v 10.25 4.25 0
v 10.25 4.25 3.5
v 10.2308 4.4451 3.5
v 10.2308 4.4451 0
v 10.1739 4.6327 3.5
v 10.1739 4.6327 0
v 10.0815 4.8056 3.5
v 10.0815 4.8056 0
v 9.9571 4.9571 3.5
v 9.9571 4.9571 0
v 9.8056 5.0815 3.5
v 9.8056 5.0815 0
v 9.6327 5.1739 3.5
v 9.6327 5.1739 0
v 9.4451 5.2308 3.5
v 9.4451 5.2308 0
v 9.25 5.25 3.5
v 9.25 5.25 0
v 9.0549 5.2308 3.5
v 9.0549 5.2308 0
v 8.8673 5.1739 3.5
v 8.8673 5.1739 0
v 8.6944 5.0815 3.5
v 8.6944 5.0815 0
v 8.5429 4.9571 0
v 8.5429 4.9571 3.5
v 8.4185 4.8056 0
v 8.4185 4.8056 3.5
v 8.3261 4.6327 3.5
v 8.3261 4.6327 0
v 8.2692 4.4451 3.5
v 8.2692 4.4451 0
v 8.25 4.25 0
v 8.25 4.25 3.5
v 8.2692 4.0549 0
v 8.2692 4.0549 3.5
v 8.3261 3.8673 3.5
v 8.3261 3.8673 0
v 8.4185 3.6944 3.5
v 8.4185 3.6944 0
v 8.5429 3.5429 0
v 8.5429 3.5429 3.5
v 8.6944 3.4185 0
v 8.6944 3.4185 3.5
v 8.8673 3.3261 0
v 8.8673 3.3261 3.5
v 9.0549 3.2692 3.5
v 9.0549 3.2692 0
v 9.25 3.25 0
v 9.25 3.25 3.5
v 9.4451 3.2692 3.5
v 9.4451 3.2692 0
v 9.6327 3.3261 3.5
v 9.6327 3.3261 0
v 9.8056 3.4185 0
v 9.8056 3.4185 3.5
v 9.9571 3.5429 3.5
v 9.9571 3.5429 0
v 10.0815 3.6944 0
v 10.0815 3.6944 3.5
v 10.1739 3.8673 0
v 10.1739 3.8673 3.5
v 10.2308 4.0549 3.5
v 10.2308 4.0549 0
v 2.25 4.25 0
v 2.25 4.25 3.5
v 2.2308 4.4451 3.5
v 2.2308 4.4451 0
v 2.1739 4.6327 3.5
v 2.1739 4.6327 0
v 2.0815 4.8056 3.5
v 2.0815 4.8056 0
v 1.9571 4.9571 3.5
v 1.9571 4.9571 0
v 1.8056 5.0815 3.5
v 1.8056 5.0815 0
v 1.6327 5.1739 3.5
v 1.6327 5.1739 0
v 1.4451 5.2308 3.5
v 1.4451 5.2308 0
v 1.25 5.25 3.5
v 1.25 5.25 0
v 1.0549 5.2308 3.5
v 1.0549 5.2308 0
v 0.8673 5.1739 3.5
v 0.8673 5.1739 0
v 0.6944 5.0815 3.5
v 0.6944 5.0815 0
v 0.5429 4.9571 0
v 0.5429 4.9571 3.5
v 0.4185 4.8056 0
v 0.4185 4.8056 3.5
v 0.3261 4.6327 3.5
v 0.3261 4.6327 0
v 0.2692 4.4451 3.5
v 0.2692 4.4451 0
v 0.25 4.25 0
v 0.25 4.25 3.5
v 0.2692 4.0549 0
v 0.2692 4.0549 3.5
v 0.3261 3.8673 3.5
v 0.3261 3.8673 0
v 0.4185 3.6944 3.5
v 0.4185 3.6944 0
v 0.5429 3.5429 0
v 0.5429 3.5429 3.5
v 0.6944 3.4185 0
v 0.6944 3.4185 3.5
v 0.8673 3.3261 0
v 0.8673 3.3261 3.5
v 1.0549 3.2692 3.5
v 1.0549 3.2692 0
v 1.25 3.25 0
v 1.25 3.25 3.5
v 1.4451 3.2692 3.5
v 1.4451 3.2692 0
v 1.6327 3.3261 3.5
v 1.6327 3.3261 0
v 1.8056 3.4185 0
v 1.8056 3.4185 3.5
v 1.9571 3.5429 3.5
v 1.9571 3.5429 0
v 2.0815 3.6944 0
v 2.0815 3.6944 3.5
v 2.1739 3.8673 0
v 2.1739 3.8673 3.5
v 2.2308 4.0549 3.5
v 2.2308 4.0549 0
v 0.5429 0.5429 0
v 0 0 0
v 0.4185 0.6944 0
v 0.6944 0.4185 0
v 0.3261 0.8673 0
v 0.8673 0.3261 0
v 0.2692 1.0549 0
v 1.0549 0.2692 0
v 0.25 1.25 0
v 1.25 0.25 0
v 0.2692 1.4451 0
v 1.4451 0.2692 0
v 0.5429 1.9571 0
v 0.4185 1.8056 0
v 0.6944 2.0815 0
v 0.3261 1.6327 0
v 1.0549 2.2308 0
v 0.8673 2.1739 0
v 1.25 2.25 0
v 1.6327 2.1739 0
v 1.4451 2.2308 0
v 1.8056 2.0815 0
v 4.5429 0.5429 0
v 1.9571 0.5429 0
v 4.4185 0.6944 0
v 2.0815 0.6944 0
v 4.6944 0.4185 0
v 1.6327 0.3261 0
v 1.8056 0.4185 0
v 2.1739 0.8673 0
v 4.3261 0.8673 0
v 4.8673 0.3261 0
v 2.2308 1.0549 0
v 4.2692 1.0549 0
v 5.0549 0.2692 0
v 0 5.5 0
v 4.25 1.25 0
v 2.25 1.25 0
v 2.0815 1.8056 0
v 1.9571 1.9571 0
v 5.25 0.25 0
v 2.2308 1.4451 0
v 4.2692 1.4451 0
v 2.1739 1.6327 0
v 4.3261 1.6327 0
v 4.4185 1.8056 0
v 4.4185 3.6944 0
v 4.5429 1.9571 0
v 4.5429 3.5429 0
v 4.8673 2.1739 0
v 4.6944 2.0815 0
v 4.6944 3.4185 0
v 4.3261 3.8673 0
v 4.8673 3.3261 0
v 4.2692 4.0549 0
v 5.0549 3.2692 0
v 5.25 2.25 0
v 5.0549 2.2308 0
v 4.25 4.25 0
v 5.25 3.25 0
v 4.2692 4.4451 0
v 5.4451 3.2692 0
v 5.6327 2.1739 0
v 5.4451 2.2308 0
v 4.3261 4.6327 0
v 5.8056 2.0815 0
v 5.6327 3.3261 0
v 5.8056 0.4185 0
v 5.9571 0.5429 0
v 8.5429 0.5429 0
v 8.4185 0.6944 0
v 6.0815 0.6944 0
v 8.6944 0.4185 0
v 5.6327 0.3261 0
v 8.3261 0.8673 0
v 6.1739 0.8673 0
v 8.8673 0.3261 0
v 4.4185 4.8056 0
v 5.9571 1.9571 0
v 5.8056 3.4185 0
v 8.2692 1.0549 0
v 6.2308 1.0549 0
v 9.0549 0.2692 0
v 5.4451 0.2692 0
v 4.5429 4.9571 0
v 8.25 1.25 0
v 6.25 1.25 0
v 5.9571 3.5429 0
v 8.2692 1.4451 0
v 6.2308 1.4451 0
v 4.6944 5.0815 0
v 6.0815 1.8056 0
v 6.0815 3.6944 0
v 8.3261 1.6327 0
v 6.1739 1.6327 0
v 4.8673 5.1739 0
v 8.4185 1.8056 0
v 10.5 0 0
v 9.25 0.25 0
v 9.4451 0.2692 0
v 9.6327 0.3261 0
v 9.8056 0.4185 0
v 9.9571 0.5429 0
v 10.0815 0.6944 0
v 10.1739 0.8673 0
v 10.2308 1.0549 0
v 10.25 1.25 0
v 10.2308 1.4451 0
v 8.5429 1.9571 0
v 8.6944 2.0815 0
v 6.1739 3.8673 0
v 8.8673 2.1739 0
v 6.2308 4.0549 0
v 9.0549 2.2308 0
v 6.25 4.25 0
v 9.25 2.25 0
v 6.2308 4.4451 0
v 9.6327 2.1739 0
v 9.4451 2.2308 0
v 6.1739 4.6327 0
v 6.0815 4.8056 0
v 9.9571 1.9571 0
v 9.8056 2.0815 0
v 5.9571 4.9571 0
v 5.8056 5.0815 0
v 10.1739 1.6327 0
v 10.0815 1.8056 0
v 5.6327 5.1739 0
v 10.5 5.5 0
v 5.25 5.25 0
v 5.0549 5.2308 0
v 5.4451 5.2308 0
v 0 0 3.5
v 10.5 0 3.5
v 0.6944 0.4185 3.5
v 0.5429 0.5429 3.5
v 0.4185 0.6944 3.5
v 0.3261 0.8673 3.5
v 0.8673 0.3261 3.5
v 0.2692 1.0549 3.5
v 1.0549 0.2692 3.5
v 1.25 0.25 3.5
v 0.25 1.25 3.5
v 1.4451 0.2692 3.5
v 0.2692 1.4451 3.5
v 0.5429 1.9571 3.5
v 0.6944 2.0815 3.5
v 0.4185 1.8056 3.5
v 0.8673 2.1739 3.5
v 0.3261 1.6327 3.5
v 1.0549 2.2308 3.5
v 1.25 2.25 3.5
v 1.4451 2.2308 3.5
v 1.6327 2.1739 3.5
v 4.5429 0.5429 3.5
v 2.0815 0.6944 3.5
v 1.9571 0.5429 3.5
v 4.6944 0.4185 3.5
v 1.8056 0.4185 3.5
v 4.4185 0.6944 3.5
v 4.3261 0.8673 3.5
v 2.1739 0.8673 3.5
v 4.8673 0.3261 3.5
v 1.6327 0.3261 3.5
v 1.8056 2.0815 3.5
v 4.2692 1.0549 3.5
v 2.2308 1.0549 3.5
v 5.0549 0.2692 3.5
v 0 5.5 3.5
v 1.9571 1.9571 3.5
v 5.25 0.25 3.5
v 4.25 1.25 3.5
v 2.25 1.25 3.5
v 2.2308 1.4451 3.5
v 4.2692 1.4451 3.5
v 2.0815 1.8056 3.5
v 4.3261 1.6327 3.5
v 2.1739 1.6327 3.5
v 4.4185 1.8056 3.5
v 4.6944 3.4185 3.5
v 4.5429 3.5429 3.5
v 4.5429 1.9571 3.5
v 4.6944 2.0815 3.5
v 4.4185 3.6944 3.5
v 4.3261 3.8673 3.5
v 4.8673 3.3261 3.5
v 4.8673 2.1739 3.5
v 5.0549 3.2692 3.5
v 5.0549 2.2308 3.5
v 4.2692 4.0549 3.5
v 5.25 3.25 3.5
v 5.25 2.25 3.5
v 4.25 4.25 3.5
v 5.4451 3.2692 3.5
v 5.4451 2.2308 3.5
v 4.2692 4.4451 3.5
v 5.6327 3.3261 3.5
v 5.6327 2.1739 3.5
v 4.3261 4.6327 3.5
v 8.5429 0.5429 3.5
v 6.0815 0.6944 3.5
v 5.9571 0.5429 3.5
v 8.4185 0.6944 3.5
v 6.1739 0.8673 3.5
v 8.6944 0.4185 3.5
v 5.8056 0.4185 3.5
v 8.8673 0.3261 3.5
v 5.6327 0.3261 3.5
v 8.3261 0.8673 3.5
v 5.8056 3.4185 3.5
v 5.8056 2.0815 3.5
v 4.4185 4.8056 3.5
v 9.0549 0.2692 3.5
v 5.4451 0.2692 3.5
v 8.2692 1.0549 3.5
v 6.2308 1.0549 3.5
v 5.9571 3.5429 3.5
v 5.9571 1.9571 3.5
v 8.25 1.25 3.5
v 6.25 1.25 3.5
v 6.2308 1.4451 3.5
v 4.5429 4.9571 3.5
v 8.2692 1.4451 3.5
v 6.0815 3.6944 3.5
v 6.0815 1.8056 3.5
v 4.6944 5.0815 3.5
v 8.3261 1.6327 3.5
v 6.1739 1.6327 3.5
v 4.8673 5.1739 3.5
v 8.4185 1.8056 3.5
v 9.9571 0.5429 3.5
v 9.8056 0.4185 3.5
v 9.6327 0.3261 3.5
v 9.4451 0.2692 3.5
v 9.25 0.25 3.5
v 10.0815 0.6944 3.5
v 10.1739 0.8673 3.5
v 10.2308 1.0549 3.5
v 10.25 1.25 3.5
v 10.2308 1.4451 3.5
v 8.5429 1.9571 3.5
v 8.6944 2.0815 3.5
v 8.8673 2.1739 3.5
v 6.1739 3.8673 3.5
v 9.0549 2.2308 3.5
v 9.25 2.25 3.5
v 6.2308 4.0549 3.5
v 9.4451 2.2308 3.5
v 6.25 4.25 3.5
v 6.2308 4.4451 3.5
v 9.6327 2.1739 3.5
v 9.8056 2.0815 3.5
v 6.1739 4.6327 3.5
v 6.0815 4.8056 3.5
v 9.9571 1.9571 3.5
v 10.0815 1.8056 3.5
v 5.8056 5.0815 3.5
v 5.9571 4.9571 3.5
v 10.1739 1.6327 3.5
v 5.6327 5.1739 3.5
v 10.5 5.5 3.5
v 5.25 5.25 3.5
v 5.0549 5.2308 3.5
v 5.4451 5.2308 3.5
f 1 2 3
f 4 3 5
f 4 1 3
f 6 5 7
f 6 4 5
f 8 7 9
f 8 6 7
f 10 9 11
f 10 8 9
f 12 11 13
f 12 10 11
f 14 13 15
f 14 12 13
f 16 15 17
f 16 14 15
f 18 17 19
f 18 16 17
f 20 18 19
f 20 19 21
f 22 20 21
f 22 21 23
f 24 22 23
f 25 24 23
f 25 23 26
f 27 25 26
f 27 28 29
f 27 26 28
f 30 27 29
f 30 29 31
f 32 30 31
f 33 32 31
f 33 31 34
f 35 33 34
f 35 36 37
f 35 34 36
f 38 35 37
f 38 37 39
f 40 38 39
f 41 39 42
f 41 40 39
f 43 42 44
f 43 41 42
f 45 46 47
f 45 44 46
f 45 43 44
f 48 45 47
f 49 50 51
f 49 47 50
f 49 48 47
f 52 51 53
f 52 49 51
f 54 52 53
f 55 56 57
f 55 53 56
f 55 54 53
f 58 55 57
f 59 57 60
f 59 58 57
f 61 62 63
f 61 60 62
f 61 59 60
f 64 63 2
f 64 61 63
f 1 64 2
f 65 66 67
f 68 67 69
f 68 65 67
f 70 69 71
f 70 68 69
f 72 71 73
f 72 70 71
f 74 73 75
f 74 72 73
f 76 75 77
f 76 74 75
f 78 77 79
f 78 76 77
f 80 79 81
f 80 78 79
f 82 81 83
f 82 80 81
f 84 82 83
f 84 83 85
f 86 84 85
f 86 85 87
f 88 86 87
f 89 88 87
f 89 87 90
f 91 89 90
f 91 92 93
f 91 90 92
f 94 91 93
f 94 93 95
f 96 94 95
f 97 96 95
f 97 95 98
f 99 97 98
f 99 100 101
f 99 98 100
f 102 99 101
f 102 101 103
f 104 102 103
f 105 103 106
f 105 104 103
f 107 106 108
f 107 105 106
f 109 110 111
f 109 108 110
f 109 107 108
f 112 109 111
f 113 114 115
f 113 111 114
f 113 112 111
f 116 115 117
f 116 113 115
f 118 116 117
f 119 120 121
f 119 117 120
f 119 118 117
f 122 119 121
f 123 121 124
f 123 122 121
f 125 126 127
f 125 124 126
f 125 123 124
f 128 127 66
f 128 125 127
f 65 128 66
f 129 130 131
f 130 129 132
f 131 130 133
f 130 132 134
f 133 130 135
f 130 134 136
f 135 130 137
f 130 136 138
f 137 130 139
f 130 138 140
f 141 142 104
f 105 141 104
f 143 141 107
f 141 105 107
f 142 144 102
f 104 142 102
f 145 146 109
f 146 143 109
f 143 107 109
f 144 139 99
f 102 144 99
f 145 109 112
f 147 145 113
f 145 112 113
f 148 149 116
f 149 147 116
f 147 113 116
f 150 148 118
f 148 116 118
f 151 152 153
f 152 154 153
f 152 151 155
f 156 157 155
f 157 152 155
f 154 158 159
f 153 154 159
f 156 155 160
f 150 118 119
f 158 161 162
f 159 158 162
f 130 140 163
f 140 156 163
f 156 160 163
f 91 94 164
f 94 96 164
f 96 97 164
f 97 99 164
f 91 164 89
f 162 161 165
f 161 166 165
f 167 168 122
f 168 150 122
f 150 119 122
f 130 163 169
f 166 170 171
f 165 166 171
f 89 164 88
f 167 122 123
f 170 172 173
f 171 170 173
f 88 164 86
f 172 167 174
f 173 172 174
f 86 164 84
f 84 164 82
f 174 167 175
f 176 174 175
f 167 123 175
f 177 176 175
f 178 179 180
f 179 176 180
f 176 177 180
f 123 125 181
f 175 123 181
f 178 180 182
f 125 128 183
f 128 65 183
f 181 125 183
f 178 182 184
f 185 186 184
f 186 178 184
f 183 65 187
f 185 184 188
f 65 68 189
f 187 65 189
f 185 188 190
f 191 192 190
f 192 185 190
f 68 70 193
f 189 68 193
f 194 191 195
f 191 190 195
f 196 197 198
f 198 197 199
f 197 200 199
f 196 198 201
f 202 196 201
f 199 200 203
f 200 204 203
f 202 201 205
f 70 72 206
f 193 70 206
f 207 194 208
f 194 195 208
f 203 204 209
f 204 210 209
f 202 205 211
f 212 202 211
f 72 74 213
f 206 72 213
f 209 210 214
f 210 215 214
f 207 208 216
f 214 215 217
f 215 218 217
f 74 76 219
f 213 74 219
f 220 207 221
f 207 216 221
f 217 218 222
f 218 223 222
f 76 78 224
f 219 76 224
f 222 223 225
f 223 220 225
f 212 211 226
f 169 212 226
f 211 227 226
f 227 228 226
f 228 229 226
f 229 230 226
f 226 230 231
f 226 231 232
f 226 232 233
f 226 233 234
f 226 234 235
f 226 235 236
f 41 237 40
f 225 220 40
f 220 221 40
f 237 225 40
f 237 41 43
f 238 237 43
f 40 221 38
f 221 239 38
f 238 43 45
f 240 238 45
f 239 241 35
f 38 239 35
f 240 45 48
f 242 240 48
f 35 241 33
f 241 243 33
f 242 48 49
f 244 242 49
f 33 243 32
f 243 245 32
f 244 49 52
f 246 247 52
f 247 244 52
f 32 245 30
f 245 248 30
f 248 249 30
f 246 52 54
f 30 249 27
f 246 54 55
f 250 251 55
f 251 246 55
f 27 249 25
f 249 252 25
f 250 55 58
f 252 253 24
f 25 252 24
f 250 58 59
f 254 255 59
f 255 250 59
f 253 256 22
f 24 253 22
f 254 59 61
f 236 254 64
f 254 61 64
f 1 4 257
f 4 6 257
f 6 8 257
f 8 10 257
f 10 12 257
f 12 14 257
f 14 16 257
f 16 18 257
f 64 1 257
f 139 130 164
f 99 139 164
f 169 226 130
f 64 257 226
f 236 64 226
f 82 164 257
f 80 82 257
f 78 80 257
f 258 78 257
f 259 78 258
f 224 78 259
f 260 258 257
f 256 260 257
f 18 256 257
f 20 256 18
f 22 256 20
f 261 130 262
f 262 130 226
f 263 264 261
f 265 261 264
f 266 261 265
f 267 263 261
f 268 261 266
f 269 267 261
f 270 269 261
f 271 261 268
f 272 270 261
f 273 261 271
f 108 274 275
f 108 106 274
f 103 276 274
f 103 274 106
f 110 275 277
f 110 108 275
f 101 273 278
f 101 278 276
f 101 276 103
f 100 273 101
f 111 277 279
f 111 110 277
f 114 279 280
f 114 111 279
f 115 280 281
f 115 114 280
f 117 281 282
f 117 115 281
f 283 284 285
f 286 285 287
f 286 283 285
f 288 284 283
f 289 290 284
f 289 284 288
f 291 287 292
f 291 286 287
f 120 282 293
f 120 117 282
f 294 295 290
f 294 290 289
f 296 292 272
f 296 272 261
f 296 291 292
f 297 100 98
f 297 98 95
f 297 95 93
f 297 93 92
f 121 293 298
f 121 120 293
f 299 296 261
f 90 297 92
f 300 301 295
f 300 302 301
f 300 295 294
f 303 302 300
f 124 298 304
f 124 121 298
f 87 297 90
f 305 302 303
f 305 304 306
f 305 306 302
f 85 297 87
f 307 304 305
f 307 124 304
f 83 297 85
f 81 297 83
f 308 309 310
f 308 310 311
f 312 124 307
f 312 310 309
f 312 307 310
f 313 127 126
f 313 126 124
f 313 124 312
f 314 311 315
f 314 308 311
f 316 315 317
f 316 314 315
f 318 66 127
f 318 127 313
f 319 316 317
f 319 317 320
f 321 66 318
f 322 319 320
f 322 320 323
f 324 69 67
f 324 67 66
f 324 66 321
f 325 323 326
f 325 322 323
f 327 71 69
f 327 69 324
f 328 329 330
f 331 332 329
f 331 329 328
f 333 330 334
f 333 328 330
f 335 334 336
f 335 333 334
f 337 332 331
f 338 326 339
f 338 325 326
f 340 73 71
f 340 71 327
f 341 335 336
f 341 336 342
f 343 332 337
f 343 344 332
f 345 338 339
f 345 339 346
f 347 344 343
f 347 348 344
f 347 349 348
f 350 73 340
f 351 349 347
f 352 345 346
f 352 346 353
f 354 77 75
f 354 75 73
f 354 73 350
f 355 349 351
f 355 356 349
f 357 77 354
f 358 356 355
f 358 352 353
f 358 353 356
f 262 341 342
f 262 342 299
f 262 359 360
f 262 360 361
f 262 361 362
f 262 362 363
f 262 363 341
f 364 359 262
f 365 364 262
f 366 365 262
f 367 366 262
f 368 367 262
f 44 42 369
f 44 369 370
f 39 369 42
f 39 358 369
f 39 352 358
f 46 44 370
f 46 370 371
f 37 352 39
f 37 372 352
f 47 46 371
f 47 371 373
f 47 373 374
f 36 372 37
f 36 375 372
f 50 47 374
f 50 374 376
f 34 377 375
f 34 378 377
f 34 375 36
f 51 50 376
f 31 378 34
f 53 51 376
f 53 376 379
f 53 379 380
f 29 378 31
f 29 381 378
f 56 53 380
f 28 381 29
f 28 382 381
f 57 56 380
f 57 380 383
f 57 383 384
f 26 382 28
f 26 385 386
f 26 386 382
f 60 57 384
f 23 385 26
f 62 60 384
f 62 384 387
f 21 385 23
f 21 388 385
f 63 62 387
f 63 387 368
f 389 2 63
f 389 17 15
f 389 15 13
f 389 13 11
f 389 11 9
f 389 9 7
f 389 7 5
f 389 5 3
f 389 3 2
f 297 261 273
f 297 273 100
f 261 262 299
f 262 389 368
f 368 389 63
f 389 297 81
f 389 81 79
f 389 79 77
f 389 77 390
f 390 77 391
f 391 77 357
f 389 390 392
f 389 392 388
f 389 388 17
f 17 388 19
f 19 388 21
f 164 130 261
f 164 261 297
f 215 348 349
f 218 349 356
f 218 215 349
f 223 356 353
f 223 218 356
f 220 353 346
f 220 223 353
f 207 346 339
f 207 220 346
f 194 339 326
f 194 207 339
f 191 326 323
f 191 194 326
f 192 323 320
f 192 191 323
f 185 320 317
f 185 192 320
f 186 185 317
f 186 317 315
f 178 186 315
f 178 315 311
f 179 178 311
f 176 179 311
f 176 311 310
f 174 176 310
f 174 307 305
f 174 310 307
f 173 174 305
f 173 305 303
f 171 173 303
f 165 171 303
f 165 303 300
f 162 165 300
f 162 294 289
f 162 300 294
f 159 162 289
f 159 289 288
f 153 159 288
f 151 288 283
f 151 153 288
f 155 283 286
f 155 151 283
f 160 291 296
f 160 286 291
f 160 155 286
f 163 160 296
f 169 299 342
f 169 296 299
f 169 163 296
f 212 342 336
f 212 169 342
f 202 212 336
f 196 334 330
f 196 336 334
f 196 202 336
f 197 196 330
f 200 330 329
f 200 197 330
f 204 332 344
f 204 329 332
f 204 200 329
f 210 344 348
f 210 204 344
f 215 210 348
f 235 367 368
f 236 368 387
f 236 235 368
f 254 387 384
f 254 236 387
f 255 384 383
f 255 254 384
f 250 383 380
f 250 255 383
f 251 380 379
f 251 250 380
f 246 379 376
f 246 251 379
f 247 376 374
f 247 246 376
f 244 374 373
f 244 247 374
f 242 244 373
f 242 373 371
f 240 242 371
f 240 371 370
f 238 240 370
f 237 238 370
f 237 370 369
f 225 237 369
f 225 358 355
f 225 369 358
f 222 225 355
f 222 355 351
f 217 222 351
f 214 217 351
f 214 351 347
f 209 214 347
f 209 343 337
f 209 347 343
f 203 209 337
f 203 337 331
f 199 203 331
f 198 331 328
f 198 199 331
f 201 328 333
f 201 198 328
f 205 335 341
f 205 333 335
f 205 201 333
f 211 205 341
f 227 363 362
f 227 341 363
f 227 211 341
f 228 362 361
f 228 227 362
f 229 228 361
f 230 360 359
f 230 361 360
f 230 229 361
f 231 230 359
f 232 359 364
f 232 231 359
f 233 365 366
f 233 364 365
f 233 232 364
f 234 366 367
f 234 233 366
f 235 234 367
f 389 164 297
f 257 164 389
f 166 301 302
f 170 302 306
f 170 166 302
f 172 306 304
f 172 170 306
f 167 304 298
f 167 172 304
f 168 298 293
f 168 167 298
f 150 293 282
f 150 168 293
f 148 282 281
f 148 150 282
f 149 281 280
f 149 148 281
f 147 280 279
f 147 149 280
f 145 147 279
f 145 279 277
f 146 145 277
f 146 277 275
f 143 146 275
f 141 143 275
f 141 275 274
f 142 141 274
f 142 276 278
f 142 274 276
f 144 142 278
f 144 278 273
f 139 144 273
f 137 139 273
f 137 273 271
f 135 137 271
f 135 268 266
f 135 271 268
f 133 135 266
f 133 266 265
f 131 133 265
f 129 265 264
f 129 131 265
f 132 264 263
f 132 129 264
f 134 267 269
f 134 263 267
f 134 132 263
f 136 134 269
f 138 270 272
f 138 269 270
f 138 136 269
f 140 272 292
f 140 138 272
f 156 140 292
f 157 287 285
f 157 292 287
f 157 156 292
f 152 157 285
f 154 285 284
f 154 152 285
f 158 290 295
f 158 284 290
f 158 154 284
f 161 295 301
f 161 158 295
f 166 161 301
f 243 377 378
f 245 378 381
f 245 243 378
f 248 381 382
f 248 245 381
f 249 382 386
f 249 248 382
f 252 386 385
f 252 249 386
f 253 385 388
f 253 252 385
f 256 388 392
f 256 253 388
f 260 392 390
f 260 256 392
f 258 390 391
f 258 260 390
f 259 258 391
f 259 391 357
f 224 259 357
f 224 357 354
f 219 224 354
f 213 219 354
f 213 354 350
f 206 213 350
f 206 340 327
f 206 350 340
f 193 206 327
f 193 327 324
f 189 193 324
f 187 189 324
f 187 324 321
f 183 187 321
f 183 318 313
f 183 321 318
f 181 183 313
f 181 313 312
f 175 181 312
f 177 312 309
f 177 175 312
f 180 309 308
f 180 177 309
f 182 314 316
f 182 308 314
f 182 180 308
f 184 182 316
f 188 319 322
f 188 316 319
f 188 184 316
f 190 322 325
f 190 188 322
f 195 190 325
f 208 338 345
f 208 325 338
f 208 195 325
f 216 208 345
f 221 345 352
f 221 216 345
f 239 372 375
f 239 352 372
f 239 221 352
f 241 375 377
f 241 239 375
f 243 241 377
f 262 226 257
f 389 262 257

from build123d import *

# Parameters (mm, degrees)
SKETCH096_R      = 1
EXTRUDE013_DEPTH = 4
SKETCH095_R      = 1
EXTRUDE014_DEPTH = 4
SKETCH094_R      = 1
EXTRUDE012_DEPTH = 4
SKETCH093_W      = 10.5
SKETCH093_H      = 5.5
EXTRUDE011_DEPTH = 3.5


with BuildPart() as extrude013:
    # Sketch096 → Extrude013 (new body)
    with BuildSketch(Plane(origin=(8.25, 0.25, 0), x_dir=(1, 0, 0), z_dir=(0, 0, 1))):
        with Locations((1, 1)):
            Circle(SKETCH096_R)
        with Locations((1, 4)):
            Circle(SKETCH096_R)
    extrude(amount=EXTRUDE013_DEPTH)


with BuildPart() as extrude014:
    # Sketch095 → Extrude014 (new body)
    with BuildSketch(Plane(origin=(4.25, 0.25, 0), x_dir=(1, 0, 0), z_dir=(0, 0, 1))):
        with Locations((1, 1)):
            Circle(SKETCH095_R)
        with Locations((1, 4)):
            Circle(SKETCH095_R)
    extrude(amount=EXTRUDE014_DEPTH)


with BuildPart() as fusion008:
    # Sketch094 → Extrude012 (new body)
    with BuildSketch(Plane(origin=(0.25, 0.25, 0), x_dir=(1, 0, 0), z_dir=(0, 0, 1))):
        with Locations((1, 1)):
            Circle(SKETCH094_R)
        with Locations((1, 4)):
            Circle(SKETCH094_R)
    extrude(amount=EXTRUDE012_DEPTH)

    # Fusion008: union Extrude013, Extrude014
    add(extrude013.part)
    add(extrude014.part)


with BuildPart() as cut014:
    # Sketch093 → Extrude011 (new body)
    with BuildSketch(Plane.XY):
        with Locations((5.25, 2.75)):
            Rectangle(SKETCH093_W, SKETCH093_H)
    extrude(amount=EXTRUDE011_DEPTH)

    # Cut014: cut Fusion008
    add(fusion008.part, mode=Mode.SUBTRACT)


solid = cut014.part
